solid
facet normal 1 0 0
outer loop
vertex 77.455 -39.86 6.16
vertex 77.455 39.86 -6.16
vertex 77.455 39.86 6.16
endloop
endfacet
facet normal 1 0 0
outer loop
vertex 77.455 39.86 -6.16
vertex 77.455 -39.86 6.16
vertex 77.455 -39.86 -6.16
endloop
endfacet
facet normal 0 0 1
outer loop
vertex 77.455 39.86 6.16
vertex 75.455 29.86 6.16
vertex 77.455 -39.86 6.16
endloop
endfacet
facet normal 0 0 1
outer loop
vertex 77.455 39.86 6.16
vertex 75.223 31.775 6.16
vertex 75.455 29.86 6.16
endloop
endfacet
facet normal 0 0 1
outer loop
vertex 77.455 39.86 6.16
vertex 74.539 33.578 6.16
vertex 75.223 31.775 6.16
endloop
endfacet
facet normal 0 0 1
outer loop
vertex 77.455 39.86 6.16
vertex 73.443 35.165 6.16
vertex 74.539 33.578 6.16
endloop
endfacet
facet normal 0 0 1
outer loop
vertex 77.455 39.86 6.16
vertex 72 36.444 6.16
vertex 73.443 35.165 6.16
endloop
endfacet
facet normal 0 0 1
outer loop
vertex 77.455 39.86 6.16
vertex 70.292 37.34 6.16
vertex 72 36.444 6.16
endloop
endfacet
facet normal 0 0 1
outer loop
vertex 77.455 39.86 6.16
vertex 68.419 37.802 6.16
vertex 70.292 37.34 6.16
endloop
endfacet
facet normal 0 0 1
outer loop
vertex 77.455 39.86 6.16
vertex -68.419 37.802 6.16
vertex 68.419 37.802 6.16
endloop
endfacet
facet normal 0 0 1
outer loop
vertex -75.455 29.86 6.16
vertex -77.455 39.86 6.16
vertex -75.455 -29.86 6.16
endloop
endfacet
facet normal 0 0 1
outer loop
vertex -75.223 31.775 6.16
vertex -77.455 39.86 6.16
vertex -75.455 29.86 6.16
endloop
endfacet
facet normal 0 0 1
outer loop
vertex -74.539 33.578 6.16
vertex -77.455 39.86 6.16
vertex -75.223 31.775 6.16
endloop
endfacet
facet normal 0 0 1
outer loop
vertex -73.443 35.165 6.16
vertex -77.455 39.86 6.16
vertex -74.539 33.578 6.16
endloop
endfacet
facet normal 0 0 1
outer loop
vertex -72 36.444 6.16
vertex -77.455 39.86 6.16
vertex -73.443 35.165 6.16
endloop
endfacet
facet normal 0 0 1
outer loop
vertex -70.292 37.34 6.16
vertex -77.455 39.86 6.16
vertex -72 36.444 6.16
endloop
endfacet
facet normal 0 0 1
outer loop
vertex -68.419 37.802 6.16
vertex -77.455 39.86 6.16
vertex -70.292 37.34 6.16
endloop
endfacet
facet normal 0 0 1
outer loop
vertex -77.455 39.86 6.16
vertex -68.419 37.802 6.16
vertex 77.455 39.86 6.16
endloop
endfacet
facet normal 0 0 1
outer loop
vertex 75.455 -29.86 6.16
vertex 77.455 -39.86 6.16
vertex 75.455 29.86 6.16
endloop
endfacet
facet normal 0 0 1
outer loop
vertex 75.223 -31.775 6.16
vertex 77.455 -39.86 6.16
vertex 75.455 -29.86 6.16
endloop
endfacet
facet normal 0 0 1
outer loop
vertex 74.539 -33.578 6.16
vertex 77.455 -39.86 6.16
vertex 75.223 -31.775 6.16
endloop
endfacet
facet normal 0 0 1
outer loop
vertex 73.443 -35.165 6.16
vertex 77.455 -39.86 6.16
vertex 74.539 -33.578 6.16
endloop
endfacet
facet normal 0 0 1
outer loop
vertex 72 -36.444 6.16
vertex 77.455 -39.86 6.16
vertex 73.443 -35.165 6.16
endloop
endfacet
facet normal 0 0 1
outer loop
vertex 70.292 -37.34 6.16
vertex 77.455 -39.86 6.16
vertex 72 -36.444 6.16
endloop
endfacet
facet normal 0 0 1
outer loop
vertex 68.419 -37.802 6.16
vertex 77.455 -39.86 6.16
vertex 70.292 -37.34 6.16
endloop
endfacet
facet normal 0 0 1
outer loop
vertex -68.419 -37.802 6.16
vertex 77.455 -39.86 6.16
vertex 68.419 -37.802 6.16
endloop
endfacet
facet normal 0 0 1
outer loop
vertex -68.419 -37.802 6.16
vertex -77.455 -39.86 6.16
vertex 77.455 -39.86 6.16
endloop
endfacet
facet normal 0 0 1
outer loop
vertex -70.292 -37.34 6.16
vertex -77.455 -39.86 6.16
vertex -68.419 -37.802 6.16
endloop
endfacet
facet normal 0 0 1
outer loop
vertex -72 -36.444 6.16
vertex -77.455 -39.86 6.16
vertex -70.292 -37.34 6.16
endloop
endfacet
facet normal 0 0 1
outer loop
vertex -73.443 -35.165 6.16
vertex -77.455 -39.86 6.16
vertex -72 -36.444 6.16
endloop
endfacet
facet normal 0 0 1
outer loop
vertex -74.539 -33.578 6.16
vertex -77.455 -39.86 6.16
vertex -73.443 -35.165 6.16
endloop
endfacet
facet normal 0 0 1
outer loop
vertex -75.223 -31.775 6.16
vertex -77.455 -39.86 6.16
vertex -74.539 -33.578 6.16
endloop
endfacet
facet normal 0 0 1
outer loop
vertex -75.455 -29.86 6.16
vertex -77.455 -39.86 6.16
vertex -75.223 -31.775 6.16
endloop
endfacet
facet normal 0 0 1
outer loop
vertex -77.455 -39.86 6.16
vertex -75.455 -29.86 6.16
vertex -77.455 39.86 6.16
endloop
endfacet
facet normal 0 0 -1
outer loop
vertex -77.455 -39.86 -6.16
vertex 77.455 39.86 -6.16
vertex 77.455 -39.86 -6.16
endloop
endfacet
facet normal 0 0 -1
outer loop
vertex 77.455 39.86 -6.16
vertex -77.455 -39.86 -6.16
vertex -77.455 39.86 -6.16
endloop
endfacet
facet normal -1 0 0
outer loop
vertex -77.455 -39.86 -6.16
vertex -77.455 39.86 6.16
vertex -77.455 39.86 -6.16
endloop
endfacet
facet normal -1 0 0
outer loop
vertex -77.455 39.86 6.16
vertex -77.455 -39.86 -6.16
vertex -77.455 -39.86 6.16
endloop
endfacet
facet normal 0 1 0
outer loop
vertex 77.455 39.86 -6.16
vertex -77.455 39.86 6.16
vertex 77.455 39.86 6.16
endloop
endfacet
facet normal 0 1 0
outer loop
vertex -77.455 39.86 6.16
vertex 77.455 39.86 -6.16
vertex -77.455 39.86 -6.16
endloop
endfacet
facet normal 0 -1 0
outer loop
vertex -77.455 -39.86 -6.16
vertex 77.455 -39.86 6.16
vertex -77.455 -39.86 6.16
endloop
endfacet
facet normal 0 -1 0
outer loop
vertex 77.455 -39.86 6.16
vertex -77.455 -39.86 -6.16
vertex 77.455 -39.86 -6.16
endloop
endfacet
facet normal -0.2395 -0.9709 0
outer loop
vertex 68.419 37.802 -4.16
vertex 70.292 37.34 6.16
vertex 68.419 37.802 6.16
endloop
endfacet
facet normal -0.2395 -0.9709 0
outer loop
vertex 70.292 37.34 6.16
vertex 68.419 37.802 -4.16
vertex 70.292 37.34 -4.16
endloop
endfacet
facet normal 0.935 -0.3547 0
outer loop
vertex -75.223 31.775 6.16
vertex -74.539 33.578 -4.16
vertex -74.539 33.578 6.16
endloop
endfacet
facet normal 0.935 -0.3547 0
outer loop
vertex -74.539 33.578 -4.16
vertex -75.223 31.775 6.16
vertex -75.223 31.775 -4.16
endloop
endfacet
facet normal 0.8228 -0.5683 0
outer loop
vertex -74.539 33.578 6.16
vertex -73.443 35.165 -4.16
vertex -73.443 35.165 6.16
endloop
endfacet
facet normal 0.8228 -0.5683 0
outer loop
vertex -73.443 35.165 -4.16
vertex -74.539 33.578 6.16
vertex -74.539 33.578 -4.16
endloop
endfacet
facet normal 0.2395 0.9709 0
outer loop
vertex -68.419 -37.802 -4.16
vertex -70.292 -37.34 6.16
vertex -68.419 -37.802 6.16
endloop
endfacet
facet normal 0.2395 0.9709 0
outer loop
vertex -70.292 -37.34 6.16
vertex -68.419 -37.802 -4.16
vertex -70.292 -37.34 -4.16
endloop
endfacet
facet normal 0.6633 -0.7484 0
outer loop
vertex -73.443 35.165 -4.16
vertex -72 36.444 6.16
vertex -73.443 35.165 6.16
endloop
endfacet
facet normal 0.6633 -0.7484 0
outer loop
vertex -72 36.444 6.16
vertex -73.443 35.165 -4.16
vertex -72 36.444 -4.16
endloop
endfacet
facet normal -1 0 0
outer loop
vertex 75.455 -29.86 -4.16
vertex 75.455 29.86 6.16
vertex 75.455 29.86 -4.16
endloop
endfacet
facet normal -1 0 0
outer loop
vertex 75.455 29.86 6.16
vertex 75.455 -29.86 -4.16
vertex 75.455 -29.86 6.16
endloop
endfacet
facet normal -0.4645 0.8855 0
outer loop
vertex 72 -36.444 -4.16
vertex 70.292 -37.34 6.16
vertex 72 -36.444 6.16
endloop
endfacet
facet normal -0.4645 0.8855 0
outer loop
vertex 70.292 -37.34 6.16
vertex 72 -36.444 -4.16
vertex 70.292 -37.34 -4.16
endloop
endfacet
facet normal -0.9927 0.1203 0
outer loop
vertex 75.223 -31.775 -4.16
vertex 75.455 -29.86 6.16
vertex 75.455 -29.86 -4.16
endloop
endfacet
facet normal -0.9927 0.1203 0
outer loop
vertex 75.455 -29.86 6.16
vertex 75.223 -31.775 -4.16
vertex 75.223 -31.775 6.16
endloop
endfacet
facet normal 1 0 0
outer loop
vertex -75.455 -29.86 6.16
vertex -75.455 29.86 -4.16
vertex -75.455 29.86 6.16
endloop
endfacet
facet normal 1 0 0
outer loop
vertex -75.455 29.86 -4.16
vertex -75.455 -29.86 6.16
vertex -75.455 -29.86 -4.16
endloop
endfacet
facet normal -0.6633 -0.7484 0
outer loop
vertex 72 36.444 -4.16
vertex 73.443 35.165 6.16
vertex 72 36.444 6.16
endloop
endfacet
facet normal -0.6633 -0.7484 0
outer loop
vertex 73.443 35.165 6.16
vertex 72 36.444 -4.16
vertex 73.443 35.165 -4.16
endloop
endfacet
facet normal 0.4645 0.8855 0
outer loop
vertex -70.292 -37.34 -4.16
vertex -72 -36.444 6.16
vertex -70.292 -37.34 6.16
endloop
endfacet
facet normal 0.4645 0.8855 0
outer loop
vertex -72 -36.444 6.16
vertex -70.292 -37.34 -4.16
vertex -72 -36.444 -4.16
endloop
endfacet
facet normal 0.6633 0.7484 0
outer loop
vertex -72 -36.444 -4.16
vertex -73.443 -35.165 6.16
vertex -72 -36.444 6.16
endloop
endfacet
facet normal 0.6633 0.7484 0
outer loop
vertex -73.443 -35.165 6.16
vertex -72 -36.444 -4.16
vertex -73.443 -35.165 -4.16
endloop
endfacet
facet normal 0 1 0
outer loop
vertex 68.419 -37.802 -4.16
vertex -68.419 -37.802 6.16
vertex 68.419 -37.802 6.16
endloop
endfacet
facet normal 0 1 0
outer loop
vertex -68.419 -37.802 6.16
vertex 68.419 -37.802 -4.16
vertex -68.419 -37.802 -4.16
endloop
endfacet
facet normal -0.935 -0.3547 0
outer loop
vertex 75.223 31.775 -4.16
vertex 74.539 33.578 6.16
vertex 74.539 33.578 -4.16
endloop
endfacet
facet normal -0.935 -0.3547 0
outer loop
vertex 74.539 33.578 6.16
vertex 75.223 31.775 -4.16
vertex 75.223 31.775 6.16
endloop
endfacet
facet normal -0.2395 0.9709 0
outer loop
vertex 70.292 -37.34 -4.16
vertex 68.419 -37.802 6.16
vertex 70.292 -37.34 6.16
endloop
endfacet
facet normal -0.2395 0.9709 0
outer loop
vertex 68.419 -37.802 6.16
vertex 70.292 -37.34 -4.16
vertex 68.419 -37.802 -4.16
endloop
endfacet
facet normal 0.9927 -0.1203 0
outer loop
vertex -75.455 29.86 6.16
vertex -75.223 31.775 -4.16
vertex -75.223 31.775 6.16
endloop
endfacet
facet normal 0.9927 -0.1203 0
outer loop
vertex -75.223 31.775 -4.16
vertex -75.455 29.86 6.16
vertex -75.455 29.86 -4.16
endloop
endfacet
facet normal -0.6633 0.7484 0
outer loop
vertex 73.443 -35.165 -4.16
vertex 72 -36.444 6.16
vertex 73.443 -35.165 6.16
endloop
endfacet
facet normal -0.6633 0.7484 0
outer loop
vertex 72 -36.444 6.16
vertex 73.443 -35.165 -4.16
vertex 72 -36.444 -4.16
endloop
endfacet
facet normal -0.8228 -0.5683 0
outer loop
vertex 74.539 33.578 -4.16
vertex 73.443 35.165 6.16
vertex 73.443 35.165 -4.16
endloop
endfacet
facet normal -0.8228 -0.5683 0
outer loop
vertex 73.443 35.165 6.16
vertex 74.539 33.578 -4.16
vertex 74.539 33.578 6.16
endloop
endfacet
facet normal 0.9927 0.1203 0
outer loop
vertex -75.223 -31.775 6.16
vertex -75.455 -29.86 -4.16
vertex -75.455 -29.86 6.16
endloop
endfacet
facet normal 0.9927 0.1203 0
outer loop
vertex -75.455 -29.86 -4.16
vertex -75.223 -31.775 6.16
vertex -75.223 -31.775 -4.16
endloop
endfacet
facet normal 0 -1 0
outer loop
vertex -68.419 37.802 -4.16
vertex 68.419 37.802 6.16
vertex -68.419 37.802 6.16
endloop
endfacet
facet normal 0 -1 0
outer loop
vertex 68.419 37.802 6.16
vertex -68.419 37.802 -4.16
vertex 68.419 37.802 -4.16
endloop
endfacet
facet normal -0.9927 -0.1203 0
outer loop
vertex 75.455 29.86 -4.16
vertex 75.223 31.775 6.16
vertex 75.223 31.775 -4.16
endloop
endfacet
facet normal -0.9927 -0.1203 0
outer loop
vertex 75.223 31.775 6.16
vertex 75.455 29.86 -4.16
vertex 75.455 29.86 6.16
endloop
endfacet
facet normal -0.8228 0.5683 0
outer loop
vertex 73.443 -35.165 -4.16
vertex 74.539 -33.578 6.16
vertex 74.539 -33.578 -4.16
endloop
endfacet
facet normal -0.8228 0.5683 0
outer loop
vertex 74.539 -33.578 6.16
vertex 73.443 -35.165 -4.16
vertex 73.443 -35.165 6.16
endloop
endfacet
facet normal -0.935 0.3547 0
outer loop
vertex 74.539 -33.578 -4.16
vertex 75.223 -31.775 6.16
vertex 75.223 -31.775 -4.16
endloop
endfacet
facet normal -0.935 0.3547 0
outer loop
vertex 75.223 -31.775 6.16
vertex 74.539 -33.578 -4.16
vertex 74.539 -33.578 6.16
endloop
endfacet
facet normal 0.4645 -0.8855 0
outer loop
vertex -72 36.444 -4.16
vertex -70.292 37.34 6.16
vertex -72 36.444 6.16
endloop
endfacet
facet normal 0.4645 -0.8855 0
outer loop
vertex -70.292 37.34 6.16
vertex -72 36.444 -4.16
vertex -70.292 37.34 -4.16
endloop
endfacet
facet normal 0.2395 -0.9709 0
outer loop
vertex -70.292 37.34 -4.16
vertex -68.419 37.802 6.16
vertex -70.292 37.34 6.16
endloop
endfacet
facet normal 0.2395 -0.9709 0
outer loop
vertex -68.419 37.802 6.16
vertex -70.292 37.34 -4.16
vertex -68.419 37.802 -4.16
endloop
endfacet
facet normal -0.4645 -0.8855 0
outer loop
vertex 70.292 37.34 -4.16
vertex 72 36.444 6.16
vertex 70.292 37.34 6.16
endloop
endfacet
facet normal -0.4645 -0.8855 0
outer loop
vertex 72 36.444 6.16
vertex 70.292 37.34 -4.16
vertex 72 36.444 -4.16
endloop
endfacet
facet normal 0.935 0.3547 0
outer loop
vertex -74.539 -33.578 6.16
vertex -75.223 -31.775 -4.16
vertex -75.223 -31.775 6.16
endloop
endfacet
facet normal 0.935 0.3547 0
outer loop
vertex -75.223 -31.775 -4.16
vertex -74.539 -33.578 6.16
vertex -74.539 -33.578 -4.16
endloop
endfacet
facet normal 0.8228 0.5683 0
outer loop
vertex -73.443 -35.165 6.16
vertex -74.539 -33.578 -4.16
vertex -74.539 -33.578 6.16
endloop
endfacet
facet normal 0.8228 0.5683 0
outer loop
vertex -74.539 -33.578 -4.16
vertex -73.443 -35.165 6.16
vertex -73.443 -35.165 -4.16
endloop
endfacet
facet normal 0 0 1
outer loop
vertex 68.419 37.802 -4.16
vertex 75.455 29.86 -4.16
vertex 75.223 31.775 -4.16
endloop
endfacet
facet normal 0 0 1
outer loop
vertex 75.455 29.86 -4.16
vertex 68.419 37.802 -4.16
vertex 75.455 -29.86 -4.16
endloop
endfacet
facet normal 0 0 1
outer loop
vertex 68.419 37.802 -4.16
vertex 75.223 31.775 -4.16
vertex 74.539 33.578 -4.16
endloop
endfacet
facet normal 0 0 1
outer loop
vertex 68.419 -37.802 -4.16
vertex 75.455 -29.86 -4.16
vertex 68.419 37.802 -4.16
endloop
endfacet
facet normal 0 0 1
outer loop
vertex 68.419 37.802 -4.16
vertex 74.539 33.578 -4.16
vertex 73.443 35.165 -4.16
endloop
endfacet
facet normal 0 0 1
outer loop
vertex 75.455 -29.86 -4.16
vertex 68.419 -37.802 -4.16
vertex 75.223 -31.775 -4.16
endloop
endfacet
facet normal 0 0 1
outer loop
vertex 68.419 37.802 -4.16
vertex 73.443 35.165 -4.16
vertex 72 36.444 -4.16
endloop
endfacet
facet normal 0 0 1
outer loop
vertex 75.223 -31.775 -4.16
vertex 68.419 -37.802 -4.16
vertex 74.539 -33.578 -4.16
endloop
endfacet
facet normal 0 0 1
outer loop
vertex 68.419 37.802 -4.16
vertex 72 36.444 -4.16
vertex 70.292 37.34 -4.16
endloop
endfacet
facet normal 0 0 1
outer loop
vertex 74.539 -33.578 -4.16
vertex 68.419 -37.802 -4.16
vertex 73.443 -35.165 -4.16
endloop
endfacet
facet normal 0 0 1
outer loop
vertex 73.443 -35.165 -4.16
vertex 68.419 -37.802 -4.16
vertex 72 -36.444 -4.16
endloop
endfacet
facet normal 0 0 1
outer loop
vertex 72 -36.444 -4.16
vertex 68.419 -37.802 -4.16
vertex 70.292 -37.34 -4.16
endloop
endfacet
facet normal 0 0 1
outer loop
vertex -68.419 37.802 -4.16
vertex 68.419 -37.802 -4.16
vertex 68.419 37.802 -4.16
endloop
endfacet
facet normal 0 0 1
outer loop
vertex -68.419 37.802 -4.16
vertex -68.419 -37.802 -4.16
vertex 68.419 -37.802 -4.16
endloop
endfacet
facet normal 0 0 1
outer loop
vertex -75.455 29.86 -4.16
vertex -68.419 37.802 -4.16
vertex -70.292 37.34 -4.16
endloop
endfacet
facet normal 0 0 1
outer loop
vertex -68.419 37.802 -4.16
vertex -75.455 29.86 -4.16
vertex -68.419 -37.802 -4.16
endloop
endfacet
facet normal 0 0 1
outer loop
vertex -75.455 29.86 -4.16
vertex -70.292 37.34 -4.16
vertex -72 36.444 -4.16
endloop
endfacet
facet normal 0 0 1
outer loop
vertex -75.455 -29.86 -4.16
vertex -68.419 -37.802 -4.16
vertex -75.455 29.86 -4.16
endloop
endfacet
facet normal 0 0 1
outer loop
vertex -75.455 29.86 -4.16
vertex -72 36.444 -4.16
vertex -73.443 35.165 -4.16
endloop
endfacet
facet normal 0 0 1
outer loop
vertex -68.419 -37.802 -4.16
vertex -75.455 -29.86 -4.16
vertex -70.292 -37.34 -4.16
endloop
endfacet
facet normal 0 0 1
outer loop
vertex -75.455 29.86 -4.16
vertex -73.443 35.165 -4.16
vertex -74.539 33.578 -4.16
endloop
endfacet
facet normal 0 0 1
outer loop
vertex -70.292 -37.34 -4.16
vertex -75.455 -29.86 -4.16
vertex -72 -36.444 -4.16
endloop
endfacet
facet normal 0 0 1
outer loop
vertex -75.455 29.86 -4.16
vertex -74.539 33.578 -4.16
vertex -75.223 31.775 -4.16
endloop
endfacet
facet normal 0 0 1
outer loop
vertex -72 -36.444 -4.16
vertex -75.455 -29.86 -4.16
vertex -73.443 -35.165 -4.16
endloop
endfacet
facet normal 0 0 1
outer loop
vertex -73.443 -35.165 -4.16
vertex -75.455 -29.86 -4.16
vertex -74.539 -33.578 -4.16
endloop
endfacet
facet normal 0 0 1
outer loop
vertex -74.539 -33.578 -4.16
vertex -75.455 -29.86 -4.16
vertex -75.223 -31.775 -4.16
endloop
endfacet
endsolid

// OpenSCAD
difference(){
cube([154.91,79.72,12.32], center=true);
minkowski(){
cube([134.91,59.72,8.32], center=true);
cylinder(8.32, 8, 8);
}
}
